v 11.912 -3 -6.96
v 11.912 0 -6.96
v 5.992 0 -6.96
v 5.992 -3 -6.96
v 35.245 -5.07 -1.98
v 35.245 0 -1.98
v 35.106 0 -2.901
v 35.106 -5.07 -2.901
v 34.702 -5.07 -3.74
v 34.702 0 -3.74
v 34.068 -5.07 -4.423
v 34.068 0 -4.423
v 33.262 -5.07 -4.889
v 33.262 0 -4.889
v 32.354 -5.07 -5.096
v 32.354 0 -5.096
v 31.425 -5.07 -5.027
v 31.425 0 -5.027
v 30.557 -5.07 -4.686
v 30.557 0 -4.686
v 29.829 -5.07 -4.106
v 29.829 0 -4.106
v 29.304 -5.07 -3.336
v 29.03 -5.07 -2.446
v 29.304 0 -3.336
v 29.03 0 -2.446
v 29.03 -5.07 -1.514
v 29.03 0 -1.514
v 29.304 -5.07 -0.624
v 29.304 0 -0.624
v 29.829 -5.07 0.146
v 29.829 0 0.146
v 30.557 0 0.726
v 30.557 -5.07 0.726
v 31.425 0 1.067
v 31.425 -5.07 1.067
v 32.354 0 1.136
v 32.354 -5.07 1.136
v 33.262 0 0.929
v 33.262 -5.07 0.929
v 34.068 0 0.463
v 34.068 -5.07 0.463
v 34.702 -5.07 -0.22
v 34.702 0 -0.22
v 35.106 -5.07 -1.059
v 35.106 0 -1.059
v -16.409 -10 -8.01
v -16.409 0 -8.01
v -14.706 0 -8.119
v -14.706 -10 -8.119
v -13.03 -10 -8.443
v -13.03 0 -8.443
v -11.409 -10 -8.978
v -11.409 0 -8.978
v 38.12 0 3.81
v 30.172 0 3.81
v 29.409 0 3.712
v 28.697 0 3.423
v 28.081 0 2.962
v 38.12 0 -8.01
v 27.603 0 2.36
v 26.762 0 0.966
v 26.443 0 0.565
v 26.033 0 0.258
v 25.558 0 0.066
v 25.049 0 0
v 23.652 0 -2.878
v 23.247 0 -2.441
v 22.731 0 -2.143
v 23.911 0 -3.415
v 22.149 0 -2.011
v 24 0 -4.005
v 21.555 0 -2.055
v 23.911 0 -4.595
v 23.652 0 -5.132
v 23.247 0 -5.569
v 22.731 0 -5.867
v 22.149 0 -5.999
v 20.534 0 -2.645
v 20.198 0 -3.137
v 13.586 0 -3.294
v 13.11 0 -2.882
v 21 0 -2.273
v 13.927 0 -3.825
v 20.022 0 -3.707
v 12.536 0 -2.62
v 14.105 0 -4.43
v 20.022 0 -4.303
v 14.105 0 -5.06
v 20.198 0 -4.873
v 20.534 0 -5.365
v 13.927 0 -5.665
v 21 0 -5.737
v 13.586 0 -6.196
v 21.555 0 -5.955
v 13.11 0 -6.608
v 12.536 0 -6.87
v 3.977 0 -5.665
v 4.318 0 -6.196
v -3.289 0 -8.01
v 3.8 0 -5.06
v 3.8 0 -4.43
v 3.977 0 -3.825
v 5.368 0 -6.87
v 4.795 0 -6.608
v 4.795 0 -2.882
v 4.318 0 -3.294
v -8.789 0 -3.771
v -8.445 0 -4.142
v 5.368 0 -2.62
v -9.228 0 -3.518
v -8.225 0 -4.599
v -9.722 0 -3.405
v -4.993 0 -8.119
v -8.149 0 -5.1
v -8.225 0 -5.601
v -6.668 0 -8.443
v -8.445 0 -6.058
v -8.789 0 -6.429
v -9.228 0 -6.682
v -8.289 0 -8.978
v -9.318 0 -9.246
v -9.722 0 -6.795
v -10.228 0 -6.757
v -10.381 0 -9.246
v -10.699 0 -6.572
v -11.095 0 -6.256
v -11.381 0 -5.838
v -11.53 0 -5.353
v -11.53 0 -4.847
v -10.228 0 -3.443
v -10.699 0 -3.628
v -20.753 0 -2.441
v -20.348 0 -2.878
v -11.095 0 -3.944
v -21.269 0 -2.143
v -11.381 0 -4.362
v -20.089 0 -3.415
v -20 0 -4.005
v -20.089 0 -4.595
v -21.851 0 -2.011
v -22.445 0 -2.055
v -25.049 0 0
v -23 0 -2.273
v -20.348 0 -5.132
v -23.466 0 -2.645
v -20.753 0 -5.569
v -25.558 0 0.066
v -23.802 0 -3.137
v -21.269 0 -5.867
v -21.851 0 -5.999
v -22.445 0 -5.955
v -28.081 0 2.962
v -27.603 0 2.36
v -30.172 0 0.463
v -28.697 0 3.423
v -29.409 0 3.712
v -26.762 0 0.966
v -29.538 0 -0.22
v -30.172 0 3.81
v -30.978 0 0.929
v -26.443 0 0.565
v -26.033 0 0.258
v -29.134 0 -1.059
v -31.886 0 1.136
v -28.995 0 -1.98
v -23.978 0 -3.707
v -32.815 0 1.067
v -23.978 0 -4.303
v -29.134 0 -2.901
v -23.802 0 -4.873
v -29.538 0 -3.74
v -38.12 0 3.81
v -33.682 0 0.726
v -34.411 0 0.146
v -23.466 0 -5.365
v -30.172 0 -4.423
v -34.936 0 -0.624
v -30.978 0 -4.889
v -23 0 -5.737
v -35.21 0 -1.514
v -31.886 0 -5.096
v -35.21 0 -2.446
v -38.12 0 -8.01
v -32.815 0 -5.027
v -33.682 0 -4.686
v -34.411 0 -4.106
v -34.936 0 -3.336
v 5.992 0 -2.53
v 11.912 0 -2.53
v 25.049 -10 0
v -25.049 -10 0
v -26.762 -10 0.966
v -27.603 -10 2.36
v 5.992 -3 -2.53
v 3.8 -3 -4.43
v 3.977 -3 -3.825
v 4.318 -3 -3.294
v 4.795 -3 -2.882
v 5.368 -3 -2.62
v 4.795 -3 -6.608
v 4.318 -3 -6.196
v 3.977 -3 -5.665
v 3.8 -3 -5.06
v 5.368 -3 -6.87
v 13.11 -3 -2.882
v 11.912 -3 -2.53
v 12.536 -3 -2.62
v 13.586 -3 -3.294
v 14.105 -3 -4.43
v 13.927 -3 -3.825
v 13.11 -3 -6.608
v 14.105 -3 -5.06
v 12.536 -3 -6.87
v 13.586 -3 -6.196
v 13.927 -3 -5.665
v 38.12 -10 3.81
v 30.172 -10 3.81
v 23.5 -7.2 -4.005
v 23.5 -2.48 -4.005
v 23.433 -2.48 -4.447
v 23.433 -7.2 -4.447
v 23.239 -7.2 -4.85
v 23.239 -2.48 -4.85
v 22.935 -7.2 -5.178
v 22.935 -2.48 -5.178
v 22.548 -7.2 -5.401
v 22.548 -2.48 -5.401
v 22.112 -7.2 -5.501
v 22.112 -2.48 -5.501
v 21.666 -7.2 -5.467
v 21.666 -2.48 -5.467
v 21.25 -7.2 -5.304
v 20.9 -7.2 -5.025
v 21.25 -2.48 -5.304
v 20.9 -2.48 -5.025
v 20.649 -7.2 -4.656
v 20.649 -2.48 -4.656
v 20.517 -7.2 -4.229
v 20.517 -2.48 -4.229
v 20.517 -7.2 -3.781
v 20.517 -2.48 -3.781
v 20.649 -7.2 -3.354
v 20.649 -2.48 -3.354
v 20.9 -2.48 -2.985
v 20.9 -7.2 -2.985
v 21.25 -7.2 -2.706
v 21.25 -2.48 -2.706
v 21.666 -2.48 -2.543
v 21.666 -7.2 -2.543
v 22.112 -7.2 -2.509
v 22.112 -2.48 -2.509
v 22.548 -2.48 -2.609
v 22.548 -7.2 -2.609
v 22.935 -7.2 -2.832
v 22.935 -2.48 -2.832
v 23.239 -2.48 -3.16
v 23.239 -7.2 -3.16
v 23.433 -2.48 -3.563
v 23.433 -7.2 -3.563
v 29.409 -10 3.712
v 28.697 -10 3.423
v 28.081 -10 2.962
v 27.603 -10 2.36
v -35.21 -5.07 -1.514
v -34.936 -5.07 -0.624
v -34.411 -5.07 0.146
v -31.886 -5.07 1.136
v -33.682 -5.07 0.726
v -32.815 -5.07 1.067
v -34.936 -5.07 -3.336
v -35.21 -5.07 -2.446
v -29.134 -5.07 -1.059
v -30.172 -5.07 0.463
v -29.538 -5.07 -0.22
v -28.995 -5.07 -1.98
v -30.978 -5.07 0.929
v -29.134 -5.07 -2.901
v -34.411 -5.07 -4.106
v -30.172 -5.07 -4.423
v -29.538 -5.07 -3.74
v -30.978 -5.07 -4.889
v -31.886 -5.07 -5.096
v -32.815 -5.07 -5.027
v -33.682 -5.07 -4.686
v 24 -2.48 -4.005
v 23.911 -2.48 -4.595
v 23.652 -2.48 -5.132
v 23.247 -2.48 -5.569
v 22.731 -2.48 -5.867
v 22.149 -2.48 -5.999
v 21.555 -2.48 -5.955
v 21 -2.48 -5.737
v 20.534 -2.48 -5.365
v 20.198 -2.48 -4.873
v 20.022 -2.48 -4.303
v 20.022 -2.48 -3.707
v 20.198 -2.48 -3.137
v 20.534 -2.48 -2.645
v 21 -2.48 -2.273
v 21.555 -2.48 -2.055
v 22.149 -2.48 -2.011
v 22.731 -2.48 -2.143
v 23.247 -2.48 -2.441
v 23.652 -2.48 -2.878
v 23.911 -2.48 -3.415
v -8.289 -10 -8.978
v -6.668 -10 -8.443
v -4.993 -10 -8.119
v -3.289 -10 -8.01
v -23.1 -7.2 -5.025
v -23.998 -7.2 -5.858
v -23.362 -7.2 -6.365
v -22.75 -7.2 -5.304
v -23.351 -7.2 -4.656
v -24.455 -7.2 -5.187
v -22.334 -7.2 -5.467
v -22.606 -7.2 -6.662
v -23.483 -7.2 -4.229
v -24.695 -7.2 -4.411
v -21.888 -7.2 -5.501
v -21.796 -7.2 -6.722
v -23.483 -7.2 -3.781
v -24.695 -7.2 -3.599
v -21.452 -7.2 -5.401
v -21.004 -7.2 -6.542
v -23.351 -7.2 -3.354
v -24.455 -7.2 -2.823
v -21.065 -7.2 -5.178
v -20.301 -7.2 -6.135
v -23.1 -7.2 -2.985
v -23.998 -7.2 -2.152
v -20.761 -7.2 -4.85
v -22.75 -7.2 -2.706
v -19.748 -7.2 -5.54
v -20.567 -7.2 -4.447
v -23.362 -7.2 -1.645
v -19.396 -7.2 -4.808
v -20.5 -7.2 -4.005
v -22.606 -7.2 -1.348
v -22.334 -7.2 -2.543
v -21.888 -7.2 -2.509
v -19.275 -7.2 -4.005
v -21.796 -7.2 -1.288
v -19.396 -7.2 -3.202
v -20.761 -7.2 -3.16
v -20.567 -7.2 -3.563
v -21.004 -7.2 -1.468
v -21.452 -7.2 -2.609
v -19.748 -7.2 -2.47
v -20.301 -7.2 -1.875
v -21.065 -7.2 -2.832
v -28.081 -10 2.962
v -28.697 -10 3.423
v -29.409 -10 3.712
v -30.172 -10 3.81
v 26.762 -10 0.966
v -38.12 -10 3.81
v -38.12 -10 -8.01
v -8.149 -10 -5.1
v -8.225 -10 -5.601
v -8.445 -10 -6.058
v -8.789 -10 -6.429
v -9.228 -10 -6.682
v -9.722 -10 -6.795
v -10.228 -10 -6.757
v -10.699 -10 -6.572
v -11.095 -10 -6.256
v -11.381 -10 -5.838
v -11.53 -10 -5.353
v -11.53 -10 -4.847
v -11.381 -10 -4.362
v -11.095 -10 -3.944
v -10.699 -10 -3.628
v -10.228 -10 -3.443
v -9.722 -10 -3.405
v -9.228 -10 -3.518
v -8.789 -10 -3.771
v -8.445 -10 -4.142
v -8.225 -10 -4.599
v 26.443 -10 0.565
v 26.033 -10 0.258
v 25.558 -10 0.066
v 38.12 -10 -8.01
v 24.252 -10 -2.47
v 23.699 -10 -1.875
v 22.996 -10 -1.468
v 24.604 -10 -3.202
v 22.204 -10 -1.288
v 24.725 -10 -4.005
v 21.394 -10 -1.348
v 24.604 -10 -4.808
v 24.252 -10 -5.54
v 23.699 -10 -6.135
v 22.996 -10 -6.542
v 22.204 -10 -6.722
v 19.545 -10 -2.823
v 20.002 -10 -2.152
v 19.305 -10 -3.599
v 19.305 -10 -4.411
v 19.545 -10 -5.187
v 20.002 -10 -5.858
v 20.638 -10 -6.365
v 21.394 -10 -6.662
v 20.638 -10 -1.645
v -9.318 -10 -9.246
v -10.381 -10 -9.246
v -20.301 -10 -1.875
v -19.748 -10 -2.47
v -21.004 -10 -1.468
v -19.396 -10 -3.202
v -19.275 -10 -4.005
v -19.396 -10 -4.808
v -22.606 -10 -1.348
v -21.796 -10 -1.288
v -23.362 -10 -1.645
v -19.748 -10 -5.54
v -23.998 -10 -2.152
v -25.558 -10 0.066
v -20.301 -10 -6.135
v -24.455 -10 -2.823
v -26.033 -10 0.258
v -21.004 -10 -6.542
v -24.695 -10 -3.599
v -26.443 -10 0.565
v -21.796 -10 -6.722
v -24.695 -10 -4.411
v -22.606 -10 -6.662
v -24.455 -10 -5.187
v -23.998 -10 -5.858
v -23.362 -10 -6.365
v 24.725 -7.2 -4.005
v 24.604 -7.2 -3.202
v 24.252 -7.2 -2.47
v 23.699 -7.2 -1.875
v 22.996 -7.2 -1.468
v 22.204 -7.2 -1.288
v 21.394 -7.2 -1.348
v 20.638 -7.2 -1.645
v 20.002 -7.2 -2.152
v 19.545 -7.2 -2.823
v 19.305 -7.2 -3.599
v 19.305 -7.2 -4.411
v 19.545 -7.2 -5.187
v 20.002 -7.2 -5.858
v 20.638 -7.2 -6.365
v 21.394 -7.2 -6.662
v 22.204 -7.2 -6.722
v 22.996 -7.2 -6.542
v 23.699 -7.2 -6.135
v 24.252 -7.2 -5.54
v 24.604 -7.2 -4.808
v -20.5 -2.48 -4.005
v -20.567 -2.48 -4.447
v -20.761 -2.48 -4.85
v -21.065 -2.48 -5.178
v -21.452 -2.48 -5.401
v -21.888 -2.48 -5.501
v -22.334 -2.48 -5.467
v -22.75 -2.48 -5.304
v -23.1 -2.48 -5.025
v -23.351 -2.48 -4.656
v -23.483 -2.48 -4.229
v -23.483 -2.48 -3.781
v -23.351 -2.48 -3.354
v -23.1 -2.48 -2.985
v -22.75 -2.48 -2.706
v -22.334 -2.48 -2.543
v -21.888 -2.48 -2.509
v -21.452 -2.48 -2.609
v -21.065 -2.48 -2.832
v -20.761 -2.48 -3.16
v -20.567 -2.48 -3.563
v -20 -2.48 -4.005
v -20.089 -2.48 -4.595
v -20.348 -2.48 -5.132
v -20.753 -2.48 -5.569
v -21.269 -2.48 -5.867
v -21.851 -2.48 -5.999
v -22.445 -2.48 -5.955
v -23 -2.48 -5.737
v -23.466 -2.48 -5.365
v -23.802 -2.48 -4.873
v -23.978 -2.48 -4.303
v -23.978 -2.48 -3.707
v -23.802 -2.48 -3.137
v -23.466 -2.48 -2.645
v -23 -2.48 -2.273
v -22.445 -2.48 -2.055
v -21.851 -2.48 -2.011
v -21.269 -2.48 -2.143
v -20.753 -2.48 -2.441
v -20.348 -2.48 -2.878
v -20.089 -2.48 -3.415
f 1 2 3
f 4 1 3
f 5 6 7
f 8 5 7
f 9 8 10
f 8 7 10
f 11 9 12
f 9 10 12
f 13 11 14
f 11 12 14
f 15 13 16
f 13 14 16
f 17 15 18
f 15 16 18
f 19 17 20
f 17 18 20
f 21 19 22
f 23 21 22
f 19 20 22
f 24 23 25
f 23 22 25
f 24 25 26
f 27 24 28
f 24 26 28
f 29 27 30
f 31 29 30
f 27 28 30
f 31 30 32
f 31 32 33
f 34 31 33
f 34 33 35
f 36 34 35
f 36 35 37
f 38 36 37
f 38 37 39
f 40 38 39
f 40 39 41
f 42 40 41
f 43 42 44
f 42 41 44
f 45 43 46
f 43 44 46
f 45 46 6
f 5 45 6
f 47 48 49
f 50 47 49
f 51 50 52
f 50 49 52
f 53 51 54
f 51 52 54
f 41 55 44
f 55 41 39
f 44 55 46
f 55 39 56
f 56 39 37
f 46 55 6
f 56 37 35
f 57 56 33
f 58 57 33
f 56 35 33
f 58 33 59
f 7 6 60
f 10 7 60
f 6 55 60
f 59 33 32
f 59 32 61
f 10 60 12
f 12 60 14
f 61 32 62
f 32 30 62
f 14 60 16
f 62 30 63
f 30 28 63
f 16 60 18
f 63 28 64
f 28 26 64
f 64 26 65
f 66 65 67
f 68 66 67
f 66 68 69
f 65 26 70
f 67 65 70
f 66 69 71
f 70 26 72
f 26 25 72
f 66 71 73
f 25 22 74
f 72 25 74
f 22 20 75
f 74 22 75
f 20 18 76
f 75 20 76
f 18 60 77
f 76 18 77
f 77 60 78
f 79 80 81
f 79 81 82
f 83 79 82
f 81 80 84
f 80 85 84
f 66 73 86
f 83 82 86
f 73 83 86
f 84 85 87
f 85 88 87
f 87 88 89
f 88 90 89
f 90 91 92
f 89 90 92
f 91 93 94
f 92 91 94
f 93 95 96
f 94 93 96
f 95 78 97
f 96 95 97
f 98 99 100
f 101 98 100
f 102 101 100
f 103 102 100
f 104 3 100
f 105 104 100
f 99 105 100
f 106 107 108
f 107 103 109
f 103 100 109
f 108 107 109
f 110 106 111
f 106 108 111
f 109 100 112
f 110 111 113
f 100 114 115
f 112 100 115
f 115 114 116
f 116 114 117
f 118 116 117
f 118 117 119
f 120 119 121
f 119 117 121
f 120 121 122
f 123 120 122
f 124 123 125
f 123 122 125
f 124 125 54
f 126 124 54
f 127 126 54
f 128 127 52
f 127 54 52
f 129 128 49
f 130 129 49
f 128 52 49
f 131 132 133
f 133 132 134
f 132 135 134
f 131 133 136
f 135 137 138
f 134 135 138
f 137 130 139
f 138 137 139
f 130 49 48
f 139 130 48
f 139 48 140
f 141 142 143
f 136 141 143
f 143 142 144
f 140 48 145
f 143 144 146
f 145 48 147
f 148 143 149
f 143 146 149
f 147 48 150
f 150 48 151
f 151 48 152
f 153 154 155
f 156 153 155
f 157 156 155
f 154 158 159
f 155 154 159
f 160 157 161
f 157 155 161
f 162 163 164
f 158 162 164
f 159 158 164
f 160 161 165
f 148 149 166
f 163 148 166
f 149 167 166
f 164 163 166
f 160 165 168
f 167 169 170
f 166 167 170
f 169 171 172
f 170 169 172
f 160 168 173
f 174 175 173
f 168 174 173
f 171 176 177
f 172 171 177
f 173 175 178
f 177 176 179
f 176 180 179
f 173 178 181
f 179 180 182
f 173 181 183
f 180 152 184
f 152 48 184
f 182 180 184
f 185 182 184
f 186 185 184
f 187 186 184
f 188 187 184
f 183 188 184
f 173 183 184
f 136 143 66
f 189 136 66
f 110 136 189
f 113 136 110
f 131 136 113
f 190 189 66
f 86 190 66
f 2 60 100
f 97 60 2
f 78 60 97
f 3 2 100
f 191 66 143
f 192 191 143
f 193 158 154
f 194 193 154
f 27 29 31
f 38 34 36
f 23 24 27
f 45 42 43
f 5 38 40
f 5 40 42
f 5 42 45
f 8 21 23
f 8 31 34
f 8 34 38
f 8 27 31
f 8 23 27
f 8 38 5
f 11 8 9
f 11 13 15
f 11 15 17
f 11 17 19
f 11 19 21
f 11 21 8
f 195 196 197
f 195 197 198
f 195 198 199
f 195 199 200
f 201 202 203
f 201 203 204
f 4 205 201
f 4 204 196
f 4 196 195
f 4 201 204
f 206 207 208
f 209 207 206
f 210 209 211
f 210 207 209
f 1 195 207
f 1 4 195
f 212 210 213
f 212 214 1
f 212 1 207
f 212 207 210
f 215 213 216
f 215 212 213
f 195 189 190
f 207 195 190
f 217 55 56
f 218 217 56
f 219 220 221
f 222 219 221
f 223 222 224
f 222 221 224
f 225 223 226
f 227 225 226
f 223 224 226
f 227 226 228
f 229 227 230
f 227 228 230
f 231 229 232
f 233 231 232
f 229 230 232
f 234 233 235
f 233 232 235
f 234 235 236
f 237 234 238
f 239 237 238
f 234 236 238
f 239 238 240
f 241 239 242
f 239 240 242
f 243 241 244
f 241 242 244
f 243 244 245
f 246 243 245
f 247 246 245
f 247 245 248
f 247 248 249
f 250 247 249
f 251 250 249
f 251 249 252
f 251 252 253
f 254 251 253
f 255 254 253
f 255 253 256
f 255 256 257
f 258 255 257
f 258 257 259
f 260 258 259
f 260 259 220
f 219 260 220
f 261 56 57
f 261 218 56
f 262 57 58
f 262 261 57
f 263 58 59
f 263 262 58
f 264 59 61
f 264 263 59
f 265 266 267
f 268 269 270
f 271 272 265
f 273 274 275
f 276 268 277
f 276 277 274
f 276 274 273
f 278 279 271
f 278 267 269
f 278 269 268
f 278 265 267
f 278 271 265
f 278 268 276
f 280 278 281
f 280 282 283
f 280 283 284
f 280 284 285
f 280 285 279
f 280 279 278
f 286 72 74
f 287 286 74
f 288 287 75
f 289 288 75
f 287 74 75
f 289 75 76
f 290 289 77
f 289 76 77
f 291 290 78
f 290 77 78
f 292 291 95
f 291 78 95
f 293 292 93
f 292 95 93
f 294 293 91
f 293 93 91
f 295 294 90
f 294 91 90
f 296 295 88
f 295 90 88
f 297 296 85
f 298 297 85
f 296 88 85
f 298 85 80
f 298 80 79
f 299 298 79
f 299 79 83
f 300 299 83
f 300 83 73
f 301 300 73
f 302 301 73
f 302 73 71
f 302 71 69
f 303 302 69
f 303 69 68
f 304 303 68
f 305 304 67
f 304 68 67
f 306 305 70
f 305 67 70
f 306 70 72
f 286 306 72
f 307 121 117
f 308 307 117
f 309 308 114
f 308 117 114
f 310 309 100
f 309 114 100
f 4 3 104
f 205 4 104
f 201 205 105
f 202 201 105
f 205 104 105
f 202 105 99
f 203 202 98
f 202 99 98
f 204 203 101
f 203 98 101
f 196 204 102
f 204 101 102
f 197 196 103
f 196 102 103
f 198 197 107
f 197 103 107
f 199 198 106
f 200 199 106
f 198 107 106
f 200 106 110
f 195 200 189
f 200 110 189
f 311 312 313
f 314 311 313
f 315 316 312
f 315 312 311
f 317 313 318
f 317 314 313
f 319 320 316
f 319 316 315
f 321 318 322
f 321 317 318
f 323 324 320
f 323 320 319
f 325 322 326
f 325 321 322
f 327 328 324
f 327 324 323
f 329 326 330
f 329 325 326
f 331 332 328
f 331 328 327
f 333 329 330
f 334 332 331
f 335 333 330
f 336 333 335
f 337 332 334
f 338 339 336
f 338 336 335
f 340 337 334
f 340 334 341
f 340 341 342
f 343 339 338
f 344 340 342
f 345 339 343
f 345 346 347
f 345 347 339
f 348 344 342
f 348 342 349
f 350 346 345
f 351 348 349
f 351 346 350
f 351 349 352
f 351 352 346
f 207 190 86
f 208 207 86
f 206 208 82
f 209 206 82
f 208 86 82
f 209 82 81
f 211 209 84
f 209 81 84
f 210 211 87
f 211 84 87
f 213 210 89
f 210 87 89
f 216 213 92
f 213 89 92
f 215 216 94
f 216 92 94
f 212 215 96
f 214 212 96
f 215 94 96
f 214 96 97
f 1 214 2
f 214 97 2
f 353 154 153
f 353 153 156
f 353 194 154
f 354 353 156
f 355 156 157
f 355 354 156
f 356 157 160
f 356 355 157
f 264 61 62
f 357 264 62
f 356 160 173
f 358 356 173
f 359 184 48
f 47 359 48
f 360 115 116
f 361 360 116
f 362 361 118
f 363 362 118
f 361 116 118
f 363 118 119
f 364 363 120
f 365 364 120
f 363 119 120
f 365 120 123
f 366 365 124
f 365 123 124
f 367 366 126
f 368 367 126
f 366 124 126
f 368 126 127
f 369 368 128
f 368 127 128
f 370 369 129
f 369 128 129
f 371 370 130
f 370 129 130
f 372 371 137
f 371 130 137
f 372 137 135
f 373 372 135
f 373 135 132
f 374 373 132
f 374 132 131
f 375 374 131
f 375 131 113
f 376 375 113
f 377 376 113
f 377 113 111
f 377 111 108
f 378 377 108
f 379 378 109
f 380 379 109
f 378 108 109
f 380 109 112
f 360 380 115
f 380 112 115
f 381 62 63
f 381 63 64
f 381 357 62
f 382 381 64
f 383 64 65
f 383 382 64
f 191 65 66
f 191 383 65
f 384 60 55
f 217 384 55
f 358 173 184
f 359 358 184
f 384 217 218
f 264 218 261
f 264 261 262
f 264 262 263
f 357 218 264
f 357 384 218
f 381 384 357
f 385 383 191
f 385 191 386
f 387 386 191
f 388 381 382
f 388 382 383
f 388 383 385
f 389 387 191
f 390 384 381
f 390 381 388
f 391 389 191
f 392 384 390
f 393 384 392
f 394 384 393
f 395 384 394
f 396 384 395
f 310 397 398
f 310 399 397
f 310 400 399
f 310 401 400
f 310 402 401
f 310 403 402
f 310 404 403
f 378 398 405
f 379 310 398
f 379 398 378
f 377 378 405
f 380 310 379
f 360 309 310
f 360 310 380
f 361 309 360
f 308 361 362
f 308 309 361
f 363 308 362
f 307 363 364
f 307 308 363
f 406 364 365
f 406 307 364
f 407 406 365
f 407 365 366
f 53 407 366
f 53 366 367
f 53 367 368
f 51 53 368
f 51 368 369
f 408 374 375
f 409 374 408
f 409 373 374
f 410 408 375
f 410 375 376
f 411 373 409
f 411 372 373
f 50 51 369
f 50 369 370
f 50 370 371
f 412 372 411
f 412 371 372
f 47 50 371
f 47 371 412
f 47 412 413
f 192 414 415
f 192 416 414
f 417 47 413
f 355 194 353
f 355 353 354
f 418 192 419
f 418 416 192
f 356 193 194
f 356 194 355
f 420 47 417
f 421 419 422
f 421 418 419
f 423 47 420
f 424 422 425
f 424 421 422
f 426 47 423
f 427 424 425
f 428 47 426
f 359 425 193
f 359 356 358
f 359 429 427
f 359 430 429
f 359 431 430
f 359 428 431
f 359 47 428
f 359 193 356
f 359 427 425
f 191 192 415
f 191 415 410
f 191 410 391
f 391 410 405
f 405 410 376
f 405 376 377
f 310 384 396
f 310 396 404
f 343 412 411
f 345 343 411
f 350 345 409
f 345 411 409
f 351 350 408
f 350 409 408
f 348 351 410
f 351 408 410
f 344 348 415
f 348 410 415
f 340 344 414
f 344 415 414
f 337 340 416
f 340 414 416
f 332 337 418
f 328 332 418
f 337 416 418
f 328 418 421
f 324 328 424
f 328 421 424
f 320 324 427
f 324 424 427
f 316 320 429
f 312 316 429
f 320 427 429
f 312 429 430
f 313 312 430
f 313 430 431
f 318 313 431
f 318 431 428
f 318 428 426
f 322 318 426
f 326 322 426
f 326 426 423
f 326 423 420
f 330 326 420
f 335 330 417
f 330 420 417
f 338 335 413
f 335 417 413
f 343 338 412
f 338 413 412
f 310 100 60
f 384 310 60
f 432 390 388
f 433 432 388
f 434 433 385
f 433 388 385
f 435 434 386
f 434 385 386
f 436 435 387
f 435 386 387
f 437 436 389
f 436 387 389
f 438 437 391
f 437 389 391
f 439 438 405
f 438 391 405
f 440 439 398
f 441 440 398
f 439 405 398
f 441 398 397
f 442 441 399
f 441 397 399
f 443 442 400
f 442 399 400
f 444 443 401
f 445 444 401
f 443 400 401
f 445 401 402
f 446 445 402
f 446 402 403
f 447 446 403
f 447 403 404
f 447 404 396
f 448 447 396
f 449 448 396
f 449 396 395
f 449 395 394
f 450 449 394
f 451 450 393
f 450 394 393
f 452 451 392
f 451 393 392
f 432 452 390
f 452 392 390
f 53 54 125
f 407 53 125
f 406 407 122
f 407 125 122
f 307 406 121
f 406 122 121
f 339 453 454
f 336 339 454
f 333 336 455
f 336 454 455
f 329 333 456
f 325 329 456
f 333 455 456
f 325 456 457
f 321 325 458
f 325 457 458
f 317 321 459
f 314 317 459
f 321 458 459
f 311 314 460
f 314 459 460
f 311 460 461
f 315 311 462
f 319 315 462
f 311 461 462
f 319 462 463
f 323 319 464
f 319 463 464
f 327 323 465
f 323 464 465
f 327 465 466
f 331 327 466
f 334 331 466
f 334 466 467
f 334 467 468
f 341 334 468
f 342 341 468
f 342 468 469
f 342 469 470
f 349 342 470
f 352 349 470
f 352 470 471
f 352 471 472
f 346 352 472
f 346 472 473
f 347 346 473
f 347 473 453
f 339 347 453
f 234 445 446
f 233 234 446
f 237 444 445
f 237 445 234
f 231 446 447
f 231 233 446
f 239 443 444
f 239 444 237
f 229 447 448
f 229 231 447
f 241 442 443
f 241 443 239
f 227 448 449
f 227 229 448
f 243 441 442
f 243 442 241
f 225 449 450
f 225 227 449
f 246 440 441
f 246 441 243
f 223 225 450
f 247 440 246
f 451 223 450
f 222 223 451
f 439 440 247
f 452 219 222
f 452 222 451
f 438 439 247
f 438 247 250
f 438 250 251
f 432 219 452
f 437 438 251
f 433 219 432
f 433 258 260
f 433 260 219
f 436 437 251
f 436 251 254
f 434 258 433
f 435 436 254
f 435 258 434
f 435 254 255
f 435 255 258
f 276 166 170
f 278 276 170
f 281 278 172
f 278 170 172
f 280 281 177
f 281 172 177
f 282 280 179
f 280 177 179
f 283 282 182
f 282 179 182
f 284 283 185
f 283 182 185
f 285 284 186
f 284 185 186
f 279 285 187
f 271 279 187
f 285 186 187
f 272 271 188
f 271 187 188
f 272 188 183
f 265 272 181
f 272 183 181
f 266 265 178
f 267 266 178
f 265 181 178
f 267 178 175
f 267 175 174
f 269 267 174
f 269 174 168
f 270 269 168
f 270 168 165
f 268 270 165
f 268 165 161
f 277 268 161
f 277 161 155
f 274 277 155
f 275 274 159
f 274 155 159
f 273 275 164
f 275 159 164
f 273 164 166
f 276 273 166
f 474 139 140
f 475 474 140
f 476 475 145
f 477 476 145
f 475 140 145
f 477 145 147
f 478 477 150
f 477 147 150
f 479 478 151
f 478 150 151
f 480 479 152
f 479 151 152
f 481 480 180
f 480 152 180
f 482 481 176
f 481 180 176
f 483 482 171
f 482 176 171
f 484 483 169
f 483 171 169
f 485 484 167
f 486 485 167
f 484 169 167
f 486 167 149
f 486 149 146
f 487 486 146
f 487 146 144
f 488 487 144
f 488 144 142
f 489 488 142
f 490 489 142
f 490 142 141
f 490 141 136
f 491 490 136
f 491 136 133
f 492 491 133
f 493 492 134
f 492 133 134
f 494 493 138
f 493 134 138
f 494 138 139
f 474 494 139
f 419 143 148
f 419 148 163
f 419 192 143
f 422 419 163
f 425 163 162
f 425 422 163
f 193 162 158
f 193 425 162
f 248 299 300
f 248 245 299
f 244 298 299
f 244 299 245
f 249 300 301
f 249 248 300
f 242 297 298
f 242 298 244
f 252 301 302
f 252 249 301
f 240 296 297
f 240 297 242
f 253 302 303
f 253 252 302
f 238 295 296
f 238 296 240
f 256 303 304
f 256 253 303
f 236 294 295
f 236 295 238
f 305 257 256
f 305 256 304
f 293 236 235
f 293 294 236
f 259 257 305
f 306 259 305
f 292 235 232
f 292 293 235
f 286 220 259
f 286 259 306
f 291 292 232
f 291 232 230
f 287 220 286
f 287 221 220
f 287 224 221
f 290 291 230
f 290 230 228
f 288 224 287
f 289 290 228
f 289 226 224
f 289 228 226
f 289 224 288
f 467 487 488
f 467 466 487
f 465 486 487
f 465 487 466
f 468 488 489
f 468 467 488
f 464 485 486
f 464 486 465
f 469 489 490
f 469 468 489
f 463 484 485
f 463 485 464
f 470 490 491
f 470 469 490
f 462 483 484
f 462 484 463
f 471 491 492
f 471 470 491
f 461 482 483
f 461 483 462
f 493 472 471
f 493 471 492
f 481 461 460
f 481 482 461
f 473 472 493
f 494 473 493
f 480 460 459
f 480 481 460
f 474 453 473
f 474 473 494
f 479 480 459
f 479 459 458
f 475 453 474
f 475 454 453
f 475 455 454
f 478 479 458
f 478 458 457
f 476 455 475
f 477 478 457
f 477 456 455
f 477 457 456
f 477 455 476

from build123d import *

# Parameters (mm, degrees)
SKETCH1_R           = 2
SKETCH1_R_2         = 3.125
SKETCH1_R_3         = 1.7
BOSS_EXTRUDE1_DEPTH = 10
FILLET2_R           = 3
FILLET1_R           = 2
SKETCH1_4_R         = 3.125
CUT_EXTRUDE3_DEPTH  = 5.07
SKETCH1_7_R         = 1.7
CUT_EXTRUDE6_DEPTH  = 10
CUT_EXTRUDE5_DEPTH  = 3
SKETCH1_5_R         = 2
CUT_EXTRUDE4_DEPTH  = 2.48
SKETCH4_R           = 1.5
CUT_EXTRUDE7_DEPTH  = 10
SKETCH5_R           = 2.725
CUT_EXTRUDE8_DEPTH  = 2.8


with BuildPart() as part:
    # Sketch1 → Boss-Extrude1 (new body)
    with BuildSketch(Plane(origin=(0, 0, 0), x_dir=(1, 0, 0), z_dir=(0, 1, 0))):
        with BuildLine():
            ThreePointArc((-11.409245094, 8.977987014), (-9.849239736, 9.28), (-8.289234378, 8.977987014))
            ThreePointArc((-8.289234378, 8.977987014), (-5.835653376, 8.254222737), (-3.289234378, 8.01))
            Line((-3.289234378, 8.01), (38.12, 8.01))
            Line((38.12, 8.01), (38.12, -3.81))
            Line((38.12, -3.81), (28.478275237, -3.81))
            Line((28.478275237, -3.81), (26.178275237, 0))
            Line((26.178275237, 0), (-26.178275237, 0))
            Line((-26.178275237, 0), (-28.478275237, -3.81))
            Line((-28.478275237, -3.81), (-38.12, -3.81))
            Line((-38.12, -3.81), (-38.12, 8.01))
            Line((-38.12, 8.01), (-16.409245094, 8.01))
            ThreePointArc((-16.409245094, 8.01), (-13.862826096, 8.254222737), (-11.409245094, 8.977987014))
        make_face()
        with Locations((22, 4.005)):
            Circle(SKETCH1_R, mode=Mode.SUBTRACT)
        with Locations((-22, 4.005)):
            Circle(SKETCH1_R, mode=Mode.SUBTRACT)
        with Locations((-32.12, 1.98)):
            Circle(SKETCH1_R_2, mode=Mode.SUBTRACT)
        with Locations((32.12, 1.98)):
            Circle(SKETCH1_R_2, mode=Mode.SUBTRACT)
        with Locations((-9.849239736, 5.1)):
            Circle(SKETCH1_R_3, mode=Mode.SUBTRACT)
        with BuildLine():
            ThreePointArc((11.912105026, 2.53), (14.127105026, 4.745), (11.912105026, 6.96))
            Line((11.912105026, 6.96), (5.992105026, 6.96))
            ThreePointArc((5.992105026, 6.96), (3.777105026, 4.745), (5.992105026, 2.53))
            Line((5.992105026, 2.53), (11.912105026, 2.53))
        make_face(mode=Mode.SUBTRACT)
        with Locations((-22, 4.005)):
            Circle(SKETCH1_R)
        with Locations((-9.849239736, 5.1)):
            Circle(SKETCH1_R_3)
        with Locations((-32.12, 1.98)):
            Circle(SKETCH1_R_2)
        with BuildLine():
            Line((5.992105026, 2.53), (11.912105026, 2.53))
            ThreePointArc((11.912105026, 2.53), (14.127105026, 4.745), (11.912105026, 6.96))
            Line((11.912105026, 6.96), (5.992105026, 6.96))
            ThreePointArc((5.992105026, 6.96), (3.777105026, 4.745), (5.992105026, 2.53))
        make_face()
        with Locations((22, 4.005)):
            Circle(SKETCH1_R)
        with Locations((32.12, 1.98)):
            Circle(SKETCH1_R_2)
    extrude(amount=-BOSS_EXTRUDE1_DEPTH)

    # Fillet2
    fillet2_edges = [part.edges().sort_by_distance(p)[0] for p in [
        (28.478275237, -5, 3.81),
        (-28.478275237, -5, 3.81),
    ]]
    fillet(fillet2_edges, radius=FILLET2_R)

    # Fillet1
    fillet1_edges = [part.edges().sort_by_distance(p)[0] for p in [
        (26.178275237, -5, 0),
        (-26.178275237, -5, 0),
    ]]
    fillet(fillet1_edges, radius=FILLET1_R)

    # Sketch1_4 → Cut-Extrude3 (cut)
    with BuildSketch(Plane(origin=(0, 0, 0), x_dir=(1, 0, 0), z_dir=(0, 1, 0))):
        with Locations((32.12, 1.98)):
            Circle(SKETCH1_4_R)
        with Locations((-32.12, 1.98)):
            Circle(SKETCH1_4_R)
    extrude(amount=-CUT_EXTRUDE3_DEPTH, mode=Mode.SUBTRACT)

    # Sketch1_7 → Cut-Extrude6 (cut)
    with BuildSketch(Plane(origin=(0, 0, 0), x_dir=(1, 0, 0), z_dir=(0, 1, 0))):
        with Locations((-9.849239736, 5.1)):
            Circle(SKETCH1_7_R)
    extrude(amount=-CUT_EXTRUDE6_DEPTH, mode=Mode.SUBTRACT)

    # Sketch1_6 → Cut-Extrude5 (cut)
    with BuildSketch(Plane(origin=(0, 0, 0), x_dir=(1, 0, 0), z_dir=(0, 1, 0))):
        with BuildLine():
            Line((5.992105026, 2.53), (11.912105026, 2.53))
            ThreePointArc((11.912105026, 2.53), (14.127105026, 4.745), (11.912105026, 6.96))
            Line((11.912105026, 6.96), (5.992105026, 6.96))
            ThreePointArc((5.992105026, 6.96), (3.777105026, 4.745), (5.992105026, 2.53))
        make_face()
    extrude(amount=-CUT_EXTRUDE5_DEPTH, mode=Mode.SUBTRACT)

    # Sketch1_5 → Cut-Extrude4 (cut)
    with BuildSketch(Plane(origin=(0, 0, 0), x_dir=(1, 0, 0), z_dir=(0, 1, 0))):
        with Locations((-22, 4.005)):
            Circle(SKETCH1_5_R)
        with Locations((22, 4.005)):
            Circle(SKETCH1_5_R)
    extrude(amount=-CUT_EXTRUDE4_DEPTH, mode=Mode.SUBTRACT)

    # Sketch4 → Cut-Extrude7 (cut)
    with BuildSketch(Plane(origin=(0, 0, 0), x_dir=(1, 0, 0), z_dir=(0, 1, 0))):
        with Locations((-22, 4.005)):
            Circle(SKETCH4_R)
        with Locations((22, 4.005)):
            Circle(SKETCH4_R)
    extrude(amount=-CUT_EXTRUDE7_DEPTH, mode=Mode.SUBTRACT)

    # Sketch5 → Cut-Extrude8 (cut)
    with BuildSketch(Plane.XZ.offset(10)):
        with Locations((22, -4.005)):
            Circle(SKETCH5_R)
        with Locations((-22, -4.005)):
            Circle(SKETCH5_R)
    extrude(amount=-CUT_EXTRUDE8_DEPTH, mode=Mode.SUBTRACT)


solid = part.part
